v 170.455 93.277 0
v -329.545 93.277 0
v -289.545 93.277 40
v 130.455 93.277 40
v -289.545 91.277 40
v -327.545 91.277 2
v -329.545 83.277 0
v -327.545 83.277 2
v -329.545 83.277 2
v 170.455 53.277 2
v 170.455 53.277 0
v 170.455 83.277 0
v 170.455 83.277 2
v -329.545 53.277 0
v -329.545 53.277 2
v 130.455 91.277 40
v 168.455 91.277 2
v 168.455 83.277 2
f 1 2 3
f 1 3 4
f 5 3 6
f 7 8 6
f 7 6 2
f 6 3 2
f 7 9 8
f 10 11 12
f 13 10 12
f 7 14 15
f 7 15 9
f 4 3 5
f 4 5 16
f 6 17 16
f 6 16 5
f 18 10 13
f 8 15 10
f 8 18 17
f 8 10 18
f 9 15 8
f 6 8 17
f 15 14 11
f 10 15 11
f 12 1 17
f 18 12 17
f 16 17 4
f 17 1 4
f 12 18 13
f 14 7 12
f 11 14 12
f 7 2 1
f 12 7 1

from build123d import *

# Parameters (mm, degrees)
SKETCH2_W           = 500
SKETCH2_H           = 40
BOSS_EXTRUDE1_DEPTH = 40
SKETCH3_W           = 38
SKETCH3_H           = 38
CUT_EXTRUDE1_DEPTH  = 500
CUT_EXTRUDE2_DEPTH  = 10


with BuildPart() as part:
    # Sketch2 → Boss-Extrude1 (new body)
    with BuildSketch(Plane.XY):
        with Locations((-79.545454545, 73.276515152)):
            Rectangle(SKETCH2_W, SKETCH2_H)
    extrude(amount=BOSS_EXTRUDE1_DEPTH)

    # Sketch3 → Cut-Extrude1 (cut)
    with BuildSketch(Plane.ZY.offset(329.545454545)):
        with Locations((21, 72.276515152)):
            Rectangle(SKETCH3_W, SKETCH3_H)
    extrude(amount=-CUT_EXTRUDE1_DEPTH, mode=Mode.SUBTRACT)

    # Sketch4 → Cut-Extrude2 (cut)
    with BuildSketch(Plane(origin=(0, 93.276515152, 0), x_dir=(1, 0, 0), z_dir=(0, 1, 0))):
        Polygon((-329.545454545, 0), (-329.545454545, -40), (-289.545454545, -40), align=None)
        Polygon((170.454545455, -40), (170.454545455, 0), (130.454545455, -40), align=None)
    extrude(amount=-CUT_EXTRUDE2_DEPTH, mode=Mode.SUBTRACT)


solid = part.part
